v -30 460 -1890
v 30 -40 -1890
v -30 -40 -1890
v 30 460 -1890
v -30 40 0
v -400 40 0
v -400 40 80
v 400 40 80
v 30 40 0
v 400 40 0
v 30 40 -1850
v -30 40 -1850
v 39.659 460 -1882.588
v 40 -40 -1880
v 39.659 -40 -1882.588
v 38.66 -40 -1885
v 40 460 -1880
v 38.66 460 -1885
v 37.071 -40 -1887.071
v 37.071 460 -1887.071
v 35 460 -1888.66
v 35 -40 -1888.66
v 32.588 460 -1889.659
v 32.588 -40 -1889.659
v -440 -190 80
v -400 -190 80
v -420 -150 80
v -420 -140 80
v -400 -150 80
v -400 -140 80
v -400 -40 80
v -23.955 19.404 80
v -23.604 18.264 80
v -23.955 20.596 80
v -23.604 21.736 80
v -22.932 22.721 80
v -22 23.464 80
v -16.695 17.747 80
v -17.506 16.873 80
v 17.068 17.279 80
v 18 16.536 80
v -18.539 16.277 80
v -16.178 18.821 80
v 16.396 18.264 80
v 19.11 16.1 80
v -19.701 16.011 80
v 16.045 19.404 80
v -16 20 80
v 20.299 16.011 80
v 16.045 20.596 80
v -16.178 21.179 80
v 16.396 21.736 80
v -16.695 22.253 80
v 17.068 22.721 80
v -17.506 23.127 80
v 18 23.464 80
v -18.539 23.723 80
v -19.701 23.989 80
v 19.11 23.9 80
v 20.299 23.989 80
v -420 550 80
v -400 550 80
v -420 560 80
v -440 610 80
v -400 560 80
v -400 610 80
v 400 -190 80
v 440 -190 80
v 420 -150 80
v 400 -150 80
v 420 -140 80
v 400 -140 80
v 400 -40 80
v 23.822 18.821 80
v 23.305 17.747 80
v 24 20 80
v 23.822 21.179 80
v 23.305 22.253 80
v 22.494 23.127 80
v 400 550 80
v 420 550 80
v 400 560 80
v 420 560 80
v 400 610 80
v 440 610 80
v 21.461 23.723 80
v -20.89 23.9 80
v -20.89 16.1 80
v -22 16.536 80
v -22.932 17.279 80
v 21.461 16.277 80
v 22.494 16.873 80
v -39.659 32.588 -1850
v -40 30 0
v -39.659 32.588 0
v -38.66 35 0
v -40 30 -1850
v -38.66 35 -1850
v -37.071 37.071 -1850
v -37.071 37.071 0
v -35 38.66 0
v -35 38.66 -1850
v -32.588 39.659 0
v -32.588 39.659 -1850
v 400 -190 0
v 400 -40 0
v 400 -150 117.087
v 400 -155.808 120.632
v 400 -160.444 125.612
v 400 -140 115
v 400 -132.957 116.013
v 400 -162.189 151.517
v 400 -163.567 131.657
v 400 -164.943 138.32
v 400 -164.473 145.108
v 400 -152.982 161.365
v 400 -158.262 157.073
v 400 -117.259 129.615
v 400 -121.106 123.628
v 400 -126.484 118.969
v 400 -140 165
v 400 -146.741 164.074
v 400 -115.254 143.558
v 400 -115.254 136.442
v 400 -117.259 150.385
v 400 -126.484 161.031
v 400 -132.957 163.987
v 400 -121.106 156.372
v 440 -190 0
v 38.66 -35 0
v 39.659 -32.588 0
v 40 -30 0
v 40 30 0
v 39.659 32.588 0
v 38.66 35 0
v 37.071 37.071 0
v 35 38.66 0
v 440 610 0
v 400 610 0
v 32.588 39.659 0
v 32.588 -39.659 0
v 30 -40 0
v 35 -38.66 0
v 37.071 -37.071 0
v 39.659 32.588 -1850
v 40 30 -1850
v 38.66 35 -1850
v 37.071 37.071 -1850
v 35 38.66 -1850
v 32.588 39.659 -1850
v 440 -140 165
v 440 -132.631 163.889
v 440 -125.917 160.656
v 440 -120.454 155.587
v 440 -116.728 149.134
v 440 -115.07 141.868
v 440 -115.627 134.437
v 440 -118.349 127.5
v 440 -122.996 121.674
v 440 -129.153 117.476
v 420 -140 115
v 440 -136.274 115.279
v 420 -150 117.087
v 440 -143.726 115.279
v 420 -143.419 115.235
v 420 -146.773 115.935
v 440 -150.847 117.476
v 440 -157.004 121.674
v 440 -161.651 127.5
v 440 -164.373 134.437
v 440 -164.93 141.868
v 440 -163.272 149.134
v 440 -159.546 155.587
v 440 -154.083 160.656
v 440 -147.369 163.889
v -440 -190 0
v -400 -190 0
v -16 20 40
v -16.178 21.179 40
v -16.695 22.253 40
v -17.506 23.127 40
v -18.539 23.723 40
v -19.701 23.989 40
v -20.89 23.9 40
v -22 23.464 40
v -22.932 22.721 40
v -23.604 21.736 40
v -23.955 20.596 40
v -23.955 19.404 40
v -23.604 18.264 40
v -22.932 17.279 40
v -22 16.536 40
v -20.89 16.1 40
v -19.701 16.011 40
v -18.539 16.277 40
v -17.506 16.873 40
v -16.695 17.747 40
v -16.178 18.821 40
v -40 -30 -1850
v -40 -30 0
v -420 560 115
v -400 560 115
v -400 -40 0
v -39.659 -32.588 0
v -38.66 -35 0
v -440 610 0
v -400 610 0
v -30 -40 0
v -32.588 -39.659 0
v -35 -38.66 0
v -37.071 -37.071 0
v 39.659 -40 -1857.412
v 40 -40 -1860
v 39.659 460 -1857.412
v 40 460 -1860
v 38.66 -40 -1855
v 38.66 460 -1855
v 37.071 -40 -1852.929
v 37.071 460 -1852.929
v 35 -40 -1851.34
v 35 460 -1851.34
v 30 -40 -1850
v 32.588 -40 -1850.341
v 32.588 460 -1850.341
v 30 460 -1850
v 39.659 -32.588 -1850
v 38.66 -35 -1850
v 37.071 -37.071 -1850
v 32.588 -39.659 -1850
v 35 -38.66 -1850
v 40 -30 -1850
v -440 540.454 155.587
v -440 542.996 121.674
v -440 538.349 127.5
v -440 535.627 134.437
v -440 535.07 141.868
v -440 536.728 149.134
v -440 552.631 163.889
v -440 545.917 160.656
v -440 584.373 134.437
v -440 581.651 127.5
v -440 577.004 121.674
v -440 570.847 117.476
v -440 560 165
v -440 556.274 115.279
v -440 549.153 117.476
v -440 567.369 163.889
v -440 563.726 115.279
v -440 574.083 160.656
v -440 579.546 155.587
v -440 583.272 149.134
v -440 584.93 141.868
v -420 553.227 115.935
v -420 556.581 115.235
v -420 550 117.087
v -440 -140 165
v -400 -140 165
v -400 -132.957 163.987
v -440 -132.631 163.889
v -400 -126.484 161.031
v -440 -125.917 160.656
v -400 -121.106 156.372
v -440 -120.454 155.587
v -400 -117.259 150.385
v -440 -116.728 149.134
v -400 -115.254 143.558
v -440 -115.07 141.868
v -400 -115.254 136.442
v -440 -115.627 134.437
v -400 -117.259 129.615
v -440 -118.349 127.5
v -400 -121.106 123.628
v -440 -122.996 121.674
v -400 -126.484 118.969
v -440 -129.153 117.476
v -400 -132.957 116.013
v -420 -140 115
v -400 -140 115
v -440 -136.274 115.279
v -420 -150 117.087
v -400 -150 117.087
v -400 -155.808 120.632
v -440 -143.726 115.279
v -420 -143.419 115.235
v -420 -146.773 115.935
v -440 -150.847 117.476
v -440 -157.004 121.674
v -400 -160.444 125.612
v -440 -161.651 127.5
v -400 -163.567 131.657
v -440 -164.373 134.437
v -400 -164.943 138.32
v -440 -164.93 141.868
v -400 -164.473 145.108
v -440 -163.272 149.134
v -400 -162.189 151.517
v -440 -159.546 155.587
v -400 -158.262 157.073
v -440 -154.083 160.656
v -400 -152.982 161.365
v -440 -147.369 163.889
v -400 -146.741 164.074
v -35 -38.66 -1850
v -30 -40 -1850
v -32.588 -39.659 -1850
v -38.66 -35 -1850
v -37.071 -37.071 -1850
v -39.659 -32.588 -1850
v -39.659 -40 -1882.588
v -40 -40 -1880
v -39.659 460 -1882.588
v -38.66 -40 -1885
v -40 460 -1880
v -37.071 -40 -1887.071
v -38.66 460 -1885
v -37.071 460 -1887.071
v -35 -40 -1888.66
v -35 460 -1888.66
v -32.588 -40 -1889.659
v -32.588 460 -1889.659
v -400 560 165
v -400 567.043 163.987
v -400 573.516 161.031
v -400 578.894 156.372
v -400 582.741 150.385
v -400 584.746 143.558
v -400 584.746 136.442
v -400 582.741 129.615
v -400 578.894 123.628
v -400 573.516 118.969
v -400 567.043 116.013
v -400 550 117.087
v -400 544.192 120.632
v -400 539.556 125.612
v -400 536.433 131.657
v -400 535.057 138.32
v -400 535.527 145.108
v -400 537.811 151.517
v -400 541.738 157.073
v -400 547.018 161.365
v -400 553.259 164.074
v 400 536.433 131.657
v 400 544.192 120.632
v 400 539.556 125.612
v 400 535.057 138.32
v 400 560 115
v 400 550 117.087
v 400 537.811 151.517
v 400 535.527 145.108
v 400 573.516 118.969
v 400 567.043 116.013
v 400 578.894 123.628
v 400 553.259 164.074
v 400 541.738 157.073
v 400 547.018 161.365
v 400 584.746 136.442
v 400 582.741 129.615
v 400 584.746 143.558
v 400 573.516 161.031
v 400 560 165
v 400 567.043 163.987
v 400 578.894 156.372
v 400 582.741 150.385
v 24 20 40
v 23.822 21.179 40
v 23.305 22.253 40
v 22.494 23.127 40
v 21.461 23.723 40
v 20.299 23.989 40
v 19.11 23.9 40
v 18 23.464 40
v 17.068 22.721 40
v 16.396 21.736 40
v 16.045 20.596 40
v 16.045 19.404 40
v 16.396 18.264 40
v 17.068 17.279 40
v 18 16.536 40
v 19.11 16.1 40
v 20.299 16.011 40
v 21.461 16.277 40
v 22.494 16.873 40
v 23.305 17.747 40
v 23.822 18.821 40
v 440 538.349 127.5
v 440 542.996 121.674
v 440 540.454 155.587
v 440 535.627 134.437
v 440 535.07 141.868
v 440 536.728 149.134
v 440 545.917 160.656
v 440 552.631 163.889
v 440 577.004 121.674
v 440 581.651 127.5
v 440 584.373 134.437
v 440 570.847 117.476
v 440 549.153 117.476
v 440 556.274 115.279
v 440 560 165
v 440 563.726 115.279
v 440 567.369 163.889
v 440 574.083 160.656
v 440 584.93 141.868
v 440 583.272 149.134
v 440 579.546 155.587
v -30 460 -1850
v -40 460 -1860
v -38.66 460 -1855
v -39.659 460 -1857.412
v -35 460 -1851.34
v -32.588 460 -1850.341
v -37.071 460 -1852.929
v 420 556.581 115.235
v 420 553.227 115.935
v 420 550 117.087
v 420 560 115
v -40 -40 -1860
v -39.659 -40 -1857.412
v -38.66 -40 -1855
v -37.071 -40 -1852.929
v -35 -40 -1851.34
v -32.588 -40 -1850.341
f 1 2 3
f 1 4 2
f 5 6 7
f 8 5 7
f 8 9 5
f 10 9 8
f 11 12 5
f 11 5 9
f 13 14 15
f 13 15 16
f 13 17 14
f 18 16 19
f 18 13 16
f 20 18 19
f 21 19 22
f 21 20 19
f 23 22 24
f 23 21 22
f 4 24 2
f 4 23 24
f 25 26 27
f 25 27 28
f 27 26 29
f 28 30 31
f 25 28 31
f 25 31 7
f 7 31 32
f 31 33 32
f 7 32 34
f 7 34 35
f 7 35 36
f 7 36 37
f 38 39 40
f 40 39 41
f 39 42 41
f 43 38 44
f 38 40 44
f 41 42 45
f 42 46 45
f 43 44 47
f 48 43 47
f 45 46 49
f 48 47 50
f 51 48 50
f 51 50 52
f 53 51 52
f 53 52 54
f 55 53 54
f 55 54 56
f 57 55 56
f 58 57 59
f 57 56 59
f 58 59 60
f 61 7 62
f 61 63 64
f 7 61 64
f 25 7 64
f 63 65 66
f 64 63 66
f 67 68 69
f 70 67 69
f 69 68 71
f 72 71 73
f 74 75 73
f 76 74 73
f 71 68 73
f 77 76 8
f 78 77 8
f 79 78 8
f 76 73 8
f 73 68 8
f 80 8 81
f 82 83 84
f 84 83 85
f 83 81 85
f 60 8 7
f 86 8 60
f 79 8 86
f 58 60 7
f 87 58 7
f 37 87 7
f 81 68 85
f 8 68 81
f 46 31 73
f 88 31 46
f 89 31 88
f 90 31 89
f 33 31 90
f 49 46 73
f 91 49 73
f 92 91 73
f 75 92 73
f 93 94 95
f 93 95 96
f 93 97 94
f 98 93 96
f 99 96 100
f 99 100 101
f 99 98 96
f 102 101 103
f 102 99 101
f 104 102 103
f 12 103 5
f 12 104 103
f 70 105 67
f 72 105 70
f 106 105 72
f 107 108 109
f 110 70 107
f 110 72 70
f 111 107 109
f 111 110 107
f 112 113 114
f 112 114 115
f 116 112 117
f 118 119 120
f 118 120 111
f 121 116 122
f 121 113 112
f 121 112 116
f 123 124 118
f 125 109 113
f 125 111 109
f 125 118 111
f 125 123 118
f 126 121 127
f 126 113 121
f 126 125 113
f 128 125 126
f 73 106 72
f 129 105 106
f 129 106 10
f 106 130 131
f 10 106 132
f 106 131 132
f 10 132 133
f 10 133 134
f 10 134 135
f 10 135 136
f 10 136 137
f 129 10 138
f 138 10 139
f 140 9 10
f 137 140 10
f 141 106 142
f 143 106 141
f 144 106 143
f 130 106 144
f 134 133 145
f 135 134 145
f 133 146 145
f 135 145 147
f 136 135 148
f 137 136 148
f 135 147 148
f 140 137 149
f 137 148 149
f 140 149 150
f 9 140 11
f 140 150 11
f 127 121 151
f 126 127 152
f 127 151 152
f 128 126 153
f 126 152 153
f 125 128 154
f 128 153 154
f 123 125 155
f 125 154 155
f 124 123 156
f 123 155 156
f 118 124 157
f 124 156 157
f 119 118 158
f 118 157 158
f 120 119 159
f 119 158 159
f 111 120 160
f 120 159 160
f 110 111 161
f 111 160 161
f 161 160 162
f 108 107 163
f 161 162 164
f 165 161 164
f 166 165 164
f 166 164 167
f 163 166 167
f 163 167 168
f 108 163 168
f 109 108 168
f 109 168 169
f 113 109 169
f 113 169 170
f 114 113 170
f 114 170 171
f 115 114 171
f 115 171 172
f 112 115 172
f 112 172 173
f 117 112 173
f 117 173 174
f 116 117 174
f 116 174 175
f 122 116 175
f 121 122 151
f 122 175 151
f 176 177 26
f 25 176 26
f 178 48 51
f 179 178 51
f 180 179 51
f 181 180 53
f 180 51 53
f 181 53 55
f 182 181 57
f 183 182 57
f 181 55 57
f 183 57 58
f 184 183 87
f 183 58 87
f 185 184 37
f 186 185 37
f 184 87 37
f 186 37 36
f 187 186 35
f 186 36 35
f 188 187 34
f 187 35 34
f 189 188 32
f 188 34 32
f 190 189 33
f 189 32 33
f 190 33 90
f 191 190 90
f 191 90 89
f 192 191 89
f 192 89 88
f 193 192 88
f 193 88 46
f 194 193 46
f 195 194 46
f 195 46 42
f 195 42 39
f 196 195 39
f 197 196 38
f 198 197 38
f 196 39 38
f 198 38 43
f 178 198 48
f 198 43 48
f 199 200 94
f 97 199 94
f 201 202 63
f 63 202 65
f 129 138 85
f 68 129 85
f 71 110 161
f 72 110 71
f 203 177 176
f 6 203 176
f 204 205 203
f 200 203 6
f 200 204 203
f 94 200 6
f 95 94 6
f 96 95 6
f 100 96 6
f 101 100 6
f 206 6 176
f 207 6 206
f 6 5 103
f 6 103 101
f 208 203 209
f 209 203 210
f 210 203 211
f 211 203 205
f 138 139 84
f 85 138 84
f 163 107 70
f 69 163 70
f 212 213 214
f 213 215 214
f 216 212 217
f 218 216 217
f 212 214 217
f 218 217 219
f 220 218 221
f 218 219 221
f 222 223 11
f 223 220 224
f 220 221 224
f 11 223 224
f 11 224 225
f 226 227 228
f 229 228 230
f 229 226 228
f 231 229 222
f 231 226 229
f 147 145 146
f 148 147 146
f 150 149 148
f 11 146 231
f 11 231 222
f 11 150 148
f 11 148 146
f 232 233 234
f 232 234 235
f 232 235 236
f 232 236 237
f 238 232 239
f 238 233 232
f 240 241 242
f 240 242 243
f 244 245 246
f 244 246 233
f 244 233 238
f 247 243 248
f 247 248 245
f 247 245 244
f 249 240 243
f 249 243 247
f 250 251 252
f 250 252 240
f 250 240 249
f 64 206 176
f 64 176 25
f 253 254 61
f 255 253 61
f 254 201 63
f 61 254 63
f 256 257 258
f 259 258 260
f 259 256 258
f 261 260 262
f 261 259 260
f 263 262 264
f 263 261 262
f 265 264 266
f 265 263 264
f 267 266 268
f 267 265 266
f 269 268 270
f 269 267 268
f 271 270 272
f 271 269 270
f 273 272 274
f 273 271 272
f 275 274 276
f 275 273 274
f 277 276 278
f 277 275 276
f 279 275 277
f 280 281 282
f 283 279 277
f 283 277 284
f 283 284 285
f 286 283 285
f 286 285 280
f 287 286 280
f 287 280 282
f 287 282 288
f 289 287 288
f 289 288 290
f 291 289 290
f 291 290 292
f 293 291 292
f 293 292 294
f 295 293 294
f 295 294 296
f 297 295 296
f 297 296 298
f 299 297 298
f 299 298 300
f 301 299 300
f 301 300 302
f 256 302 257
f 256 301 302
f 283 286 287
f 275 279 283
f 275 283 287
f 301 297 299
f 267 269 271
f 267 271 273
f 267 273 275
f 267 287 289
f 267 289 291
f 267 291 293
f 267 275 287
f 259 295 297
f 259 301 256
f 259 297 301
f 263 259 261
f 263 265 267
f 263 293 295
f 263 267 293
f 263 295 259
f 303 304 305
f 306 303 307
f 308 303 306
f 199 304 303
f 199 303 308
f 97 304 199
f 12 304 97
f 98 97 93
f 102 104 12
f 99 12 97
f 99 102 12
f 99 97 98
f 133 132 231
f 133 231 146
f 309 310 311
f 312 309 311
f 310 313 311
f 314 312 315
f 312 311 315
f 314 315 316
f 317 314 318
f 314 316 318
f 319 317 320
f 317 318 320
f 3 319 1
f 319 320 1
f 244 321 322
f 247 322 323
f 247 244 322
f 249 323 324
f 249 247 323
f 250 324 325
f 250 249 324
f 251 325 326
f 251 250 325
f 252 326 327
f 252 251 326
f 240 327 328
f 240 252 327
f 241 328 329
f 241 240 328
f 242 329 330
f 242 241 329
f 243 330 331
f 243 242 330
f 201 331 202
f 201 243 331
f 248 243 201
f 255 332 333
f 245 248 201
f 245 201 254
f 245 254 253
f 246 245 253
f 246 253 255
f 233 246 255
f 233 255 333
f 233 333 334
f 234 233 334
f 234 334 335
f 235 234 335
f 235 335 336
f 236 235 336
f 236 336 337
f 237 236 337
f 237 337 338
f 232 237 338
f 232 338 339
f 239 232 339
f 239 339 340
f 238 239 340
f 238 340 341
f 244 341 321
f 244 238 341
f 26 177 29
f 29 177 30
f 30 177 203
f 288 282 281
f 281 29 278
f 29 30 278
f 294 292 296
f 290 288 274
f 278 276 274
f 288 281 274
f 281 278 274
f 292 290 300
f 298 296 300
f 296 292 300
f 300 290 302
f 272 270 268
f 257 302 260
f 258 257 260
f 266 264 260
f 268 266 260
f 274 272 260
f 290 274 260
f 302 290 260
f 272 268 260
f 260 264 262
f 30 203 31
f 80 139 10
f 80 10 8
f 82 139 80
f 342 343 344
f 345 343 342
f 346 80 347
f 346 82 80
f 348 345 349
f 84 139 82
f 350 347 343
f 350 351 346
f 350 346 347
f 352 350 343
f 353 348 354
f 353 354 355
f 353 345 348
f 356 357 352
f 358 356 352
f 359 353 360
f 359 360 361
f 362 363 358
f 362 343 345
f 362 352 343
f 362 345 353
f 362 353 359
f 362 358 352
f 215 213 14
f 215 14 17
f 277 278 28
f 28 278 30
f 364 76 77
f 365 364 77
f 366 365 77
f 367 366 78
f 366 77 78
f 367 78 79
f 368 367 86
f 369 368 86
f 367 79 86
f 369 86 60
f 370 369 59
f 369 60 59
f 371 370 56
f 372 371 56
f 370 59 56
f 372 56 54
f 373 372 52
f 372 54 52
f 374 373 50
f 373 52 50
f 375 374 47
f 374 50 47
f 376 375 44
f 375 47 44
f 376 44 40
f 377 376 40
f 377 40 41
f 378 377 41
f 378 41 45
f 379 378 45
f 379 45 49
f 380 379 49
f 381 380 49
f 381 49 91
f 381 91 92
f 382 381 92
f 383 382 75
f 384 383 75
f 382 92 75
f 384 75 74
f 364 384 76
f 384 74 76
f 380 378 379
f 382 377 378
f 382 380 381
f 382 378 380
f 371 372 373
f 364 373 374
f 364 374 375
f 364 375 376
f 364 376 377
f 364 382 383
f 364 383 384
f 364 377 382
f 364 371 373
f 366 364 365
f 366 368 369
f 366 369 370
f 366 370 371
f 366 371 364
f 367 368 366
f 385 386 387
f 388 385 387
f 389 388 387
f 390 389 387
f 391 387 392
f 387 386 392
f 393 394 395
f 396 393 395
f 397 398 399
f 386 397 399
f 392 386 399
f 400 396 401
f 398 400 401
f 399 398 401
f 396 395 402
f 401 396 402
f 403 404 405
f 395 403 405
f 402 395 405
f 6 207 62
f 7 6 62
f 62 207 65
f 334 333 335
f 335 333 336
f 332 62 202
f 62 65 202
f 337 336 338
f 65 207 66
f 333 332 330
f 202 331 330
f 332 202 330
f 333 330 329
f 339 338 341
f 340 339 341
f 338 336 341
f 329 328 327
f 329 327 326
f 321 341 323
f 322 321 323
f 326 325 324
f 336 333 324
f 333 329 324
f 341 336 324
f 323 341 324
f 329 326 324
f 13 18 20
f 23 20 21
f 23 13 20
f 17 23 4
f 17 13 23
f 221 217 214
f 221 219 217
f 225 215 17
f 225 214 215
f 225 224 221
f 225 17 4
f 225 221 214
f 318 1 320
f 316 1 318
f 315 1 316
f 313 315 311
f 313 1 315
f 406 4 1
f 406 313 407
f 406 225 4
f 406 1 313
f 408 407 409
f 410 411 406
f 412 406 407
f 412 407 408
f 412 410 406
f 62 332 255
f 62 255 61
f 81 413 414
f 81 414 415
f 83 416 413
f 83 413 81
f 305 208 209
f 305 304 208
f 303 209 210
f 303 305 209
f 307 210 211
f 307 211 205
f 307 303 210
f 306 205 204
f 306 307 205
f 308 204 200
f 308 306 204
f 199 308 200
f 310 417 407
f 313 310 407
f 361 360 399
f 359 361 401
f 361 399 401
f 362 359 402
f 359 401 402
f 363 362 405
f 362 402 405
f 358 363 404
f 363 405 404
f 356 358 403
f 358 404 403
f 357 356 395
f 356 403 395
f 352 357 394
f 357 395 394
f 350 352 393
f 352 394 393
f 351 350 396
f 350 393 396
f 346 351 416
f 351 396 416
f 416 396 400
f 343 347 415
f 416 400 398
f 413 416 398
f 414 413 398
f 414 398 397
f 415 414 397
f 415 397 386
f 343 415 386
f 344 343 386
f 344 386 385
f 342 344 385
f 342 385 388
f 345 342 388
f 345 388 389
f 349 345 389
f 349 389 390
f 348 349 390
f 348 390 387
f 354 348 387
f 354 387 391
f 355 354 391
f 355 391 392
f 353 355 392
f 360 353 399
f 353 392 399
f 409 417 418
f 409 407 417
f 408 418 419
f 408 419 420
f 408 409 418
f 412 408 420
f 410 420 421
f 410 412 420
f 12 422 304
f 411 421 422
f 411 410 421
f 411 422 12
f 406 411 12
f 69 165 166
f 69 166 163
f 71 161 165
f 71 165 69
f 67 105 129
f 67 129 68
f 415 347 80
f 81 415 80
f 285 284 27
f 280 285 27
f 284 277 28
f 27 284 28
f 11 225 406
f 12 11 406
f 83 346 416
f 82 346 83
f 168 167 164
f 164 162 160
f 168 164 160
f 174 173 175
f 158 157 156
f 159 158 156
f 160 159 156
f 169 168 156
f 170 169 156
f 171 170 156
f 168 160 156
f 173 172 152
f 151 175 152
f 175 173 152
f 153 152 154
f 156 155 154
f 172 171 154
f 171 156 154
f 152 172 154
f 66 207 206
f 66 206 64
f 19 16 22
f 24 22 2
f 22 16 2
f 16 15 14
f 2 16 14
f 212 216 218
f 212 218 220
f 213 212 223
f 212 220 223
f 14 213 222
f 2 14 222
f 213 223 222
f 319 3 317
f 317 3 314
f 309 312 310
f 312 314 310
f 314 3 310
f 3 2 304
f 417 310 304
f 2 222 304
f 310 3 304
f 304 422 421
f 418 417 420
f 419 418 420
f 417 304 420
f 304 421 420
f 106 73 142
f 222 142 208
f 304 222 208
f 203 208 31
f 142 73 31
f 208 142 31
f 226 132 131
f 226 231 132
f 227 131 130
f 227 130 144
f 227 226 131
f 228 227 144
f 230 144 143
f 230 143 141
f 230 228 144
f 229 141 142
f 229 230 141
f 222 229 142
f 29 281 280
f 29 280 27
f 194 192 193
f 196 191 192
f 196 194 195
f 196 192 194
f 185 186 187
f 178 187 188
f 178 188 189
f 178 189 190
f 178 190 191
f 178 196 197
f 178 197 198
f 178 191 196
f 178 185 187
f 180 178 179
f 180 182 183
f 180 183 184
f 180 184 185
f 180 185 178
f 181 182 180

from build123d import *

# Parameters (mm, degrees)
SKETCH_1_W          = 800
SKETCH_1_H          = 80
EXTRUDE_1_DEPTH     = 80
SKETCH_2_W          = 80
SKETCH_2_H          = 80
EXTRUDE_2_DEPTH     = 1850
SKETCH_3_W          = 80
SKETCH_3_H          = 500
EXTRUDE_3_DEPTH     = 40
SKETCH_4_W          = 80
SKETCH_4_H          = 800
EXTRUDE_4_DEPTH     = 40
SKETCH_5_R          = 4
CUT_EXTRUDE_1_DEPTH = 40
SKETCH_7_R          = 4
CUT_EXTRUDE_2_DEPTH = 40
FILLET_1_R          = 10
FILLET_2_R          = 10
SKETCH_9_R          = 25
EXTRUDE_5_DEPTH     = 40
EXTRUDE_5_2_DEPTH   = 40
SKETCH_10_W         = 60
SKETCH_10_H         = 10
EXTRUDE_1_2_DEPTH   = 20


with BuildPart() as part:
    # 草图1 → Extrude 1 (new body)
    with BuildSketch(Plane.XY):
        Rectangle(SKETCH_1_W, SKETCH_1_H)
    extrude(amount=EXTRUDE_1_DEPTH)

    # 草图7 → 切除-拉伸2 (cut)
    with BuildSketch(Plane.XY.offset(80)):
        with Locations((-20, 20)):
            Circle(SKETCH_7_R)
        with Locations((20, 20)):
            Circle(SKETCH_7_R)
    extrude(amount=-CUT_EXTRUDE_2_DEPTH, mode=Mode.SUBTRACT)


with BuildPart() as body_2:
    # 草图2 → 凸台-拉伸2 (new body)
    with BuildSketch(Plane(origin=(0, 0, 0), x_dir=(-1, 0, 0), z_dir=(0, 0, -1))):
        Rectangle(SKETCH_2_W, SKETCH_2_H)
    extrude(amount=EXTRUDE_2_DEPTH)

    # 圆角1
    fillet_1_edges = [body_2.edges().sort_by_distance(p)[0] for p in [
        (40, 40, -925),
        (-40, 40, -925),
        (-40, -40, -925),
        (40, -40, -925),
    ]]
    fillet(fillet_1_edges, radius=FILLET_1_R)


with BuildPart() as body_3:
    # 草图3 → 凸台-拉伸3 (new body)
    with BuildSketch(Plane(origin=(0, 0, -1850), x_dir=(-1, 0, 0), z_dir=(0, 0, -1))):
        with Locations((0, 210)):
            Rectangle(SKETCH_3_W, SKETCH_3_H)
    extrude(amount=EXTRUDE_3_DEPTH)

    # 圆角2
    fillet_2_edges = [body_3.edges().sort_by_distance(p)[0] for p in [
        (-40, 210, -1890),
        (40, 210, -1890),
        (-40, 210, -1850),
        (40, 210, -1850),
    ]]
    fillet(fillet_2_edges, radius=FILLET_2_R)


with BuildPart() as body_4:
    # 草图4 → 凸台-拉伸4 (new body)
    with BuildSketch(Plane.ZY.offset(400)):
        with Locations((40, 210)):
            Rectangle(SKETCH_4_W, SKETCH_4_H)
    extrude(amount=EXTRUDE_4_DEPTH)


with BuildPart() as body_5:
    # 镜向2: mirrored copy
    add(body_4.part.mirror(Plane(origin=(0, 0, 0), x_dir=(0, 0, 1), z_dir=(1, 0, 0))))

    # 草图5 → 切除-拉伸1 (cut)
    with BuildSketch(Plane(origin=(440, 0, 0), x_dir=(0, 0, -1), z_dir=(1, 0, 0))):
        with Locations((-20, 20)):
            Circle(SKETCH_5_R)
        with Locations((-20, -20)):
            Circle(SKETCH_5_R)
    extrude(amount=-CUT_EXTRUDE_1_DEPTH, mode=Mode.SUBTRACT)


with BuildPart() as body_6:
    # 草图9 → 凸台-拉伸5 (new body)
    with BuildSketch(Plane.ZY.offset(440)):
        with Locations((140, 560)):
            Circle(SKETCH_9_R)
    extrude(amount=-EXTRUDE_5_DEPTH)


with BuildPart() as body_7:
    # 草图9 → Extrude 5 2 (new body)
    with BuildSketch(Plane.ZY.offset(440)):
        with Locations((140, -140)):
            Circle(SKETCH_9_R)
    extrude(amount=-EXTRUDE_5_2_DEPTH)


with BuildPart() as body_4_1:
    add(body_4.part)

    add(body_6.part)  # Extrude 1 2 merges body 6

    add(body_7.part)  # Extrude 1 2 merges body 7
    # 草图10 → Extrude 1 2 (add)
    with BuildSketch(Plane(origin=(-400, 0, 0), x_dir=(0, 0, -1), z_dir=(1, 0, 0))):
        with Locations((-110, 555)):
            Rectangle(SKETCH_10_W, SKETCH_10_H)
        with Locations((-110, -145)):
            Rectangle(SKETCH_10_W, SKETCH_10_H)
    extrude(amount=-EXTRUDE_1_2_DEPTH)


with BuildPart() as body_6_2:
    # 镜向6: mirrored copy
    add(body_4_1.part.mirror(Plane(origin=(0, 0, 0), x_dir=(0, 0, 1), z_dir=(1, 0, 0))))


with BuildPart() as part_1:
    add(part.part)

    # Combine 1: union body 5, body 6 2, body 2, body 4
    add(body_5.part)
    add(body_6_2.part)
    add(body_2.part)
    add(body_4_1.part)

    # Combine 2: union body 3
    add(body_3.part)


solid = part_1.part
